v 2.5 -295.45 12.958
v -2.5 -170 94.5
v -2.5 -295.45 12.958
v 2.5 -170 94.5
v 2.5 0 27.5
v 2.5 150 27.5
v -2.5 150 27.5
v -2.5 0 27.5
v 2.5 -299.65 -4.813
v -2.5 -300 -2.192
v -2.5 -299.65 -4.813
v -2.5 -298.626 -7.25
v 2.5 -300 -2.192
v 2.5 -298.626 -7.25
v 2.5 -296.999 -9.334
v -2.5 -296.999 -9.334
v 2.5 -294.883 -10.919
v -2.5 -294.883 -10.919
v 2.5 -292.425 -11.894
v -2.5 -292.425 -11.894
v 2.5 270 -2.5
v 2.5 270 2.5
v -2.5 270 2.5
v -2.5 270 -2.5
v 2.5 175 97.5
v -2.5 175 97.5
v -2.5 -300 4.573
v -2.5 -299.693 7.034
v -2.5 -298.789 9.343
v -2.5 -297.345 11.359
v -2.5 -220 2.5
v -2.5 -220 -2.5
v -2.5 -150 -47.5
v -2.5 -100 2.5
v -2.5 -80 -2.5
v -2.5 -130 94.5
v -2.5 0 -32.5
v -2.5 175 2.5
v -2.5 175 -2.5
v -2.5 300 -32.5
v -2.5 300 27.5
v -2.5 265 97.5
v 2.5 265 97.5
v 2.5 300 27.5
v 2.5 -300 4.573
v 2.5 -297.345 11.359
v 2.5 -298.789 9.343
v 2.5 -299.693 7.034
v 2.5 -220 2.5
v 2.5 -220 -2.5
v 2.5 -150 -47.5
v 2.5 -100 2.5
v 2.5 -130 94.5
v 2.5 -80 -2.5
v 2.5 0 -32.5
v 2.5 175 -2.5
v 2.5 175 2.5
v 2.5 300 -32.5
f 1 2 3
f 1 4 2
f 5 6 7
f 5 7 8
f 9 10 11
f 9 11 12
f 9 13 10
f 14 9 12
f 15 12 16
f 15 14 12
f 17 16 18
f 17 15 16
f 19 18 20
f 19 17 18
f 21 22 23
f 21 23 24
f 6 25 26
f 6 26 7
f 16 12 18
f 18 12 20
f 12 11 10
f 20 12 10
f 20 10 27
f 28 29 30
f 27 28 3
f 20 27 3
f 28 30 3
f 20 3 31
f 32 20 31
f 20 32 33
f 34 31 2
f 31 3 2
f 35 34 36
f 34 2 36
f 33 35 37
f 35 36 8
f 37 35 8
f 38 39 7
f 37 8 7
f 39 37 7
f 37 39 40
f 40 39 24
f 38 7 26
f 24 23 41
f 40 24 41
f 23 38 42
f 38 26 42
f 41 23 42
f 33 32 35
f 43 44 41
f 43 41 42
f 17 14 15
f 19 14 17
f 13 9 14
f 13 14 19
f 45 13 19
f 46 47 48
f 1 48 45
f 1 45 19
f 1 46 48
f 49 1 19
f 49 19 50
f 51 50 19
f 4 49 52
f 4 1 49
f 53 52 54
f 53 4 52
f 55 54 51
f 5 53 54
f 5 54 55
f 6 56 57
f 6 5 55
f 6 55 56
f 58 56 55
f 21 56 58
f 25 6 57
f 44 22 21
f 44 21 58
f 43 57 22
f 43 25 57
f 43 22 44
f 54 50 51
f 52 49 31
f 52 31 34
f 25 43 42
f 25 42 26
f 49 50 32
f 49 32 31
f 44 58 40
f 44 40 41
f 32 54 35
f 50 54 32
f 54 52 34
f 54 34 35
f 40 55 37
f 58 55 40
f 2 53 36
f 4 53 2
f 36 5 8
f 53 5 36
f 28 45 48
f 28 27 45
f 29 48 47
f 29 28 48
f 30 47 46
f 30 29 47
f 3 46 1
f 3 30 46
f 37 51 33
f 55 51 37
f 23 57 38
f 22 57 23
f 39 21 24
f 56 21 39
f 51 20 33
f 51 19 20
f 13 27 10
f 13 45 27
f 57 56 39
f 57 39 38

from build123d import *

# Parameters (mm, degrees)
F1_DEPTH = 2.5
F2_R     = 10
F3_R     = 10


with BuildPart() as f1:
    # F0 (on Right) → F1 (new body, symmetric)
    with BuildSketch(Plane.YZ):
        Polygon((-300, 10), (-300, 0), (-300, -10), (-150, -47.5), (0, -32.5), (300, -32.5), (300, 27.5), (265, 97.5), (175, 97.5), (150, 27.5), (0, 27.5), (-130, 94.5), (-150, 94.5), (-170, 94.5), align=None)
        Polygon((-220, -2.5), (-220, 0), (-220, 2.5), (-100, 2.5), (-80, 2.5), (-80, -2.5), align=None, mode=Mode.SUBTRACT)
        Polygon((270, 2.5), (270, 0), (270, -2.5), (175, -2.5), (175, 2.5), align=None, mode=Mode.SUBTRACT)
        Polygon((-80, 2.5), (-100, 2.5), (-80, -2.5), align=None)
    extrude(amount=F1_DEPTH, both=True)

    # F2
    f2_edges = [f1.edges().sort_by_distance(p)[0] for p in [
        (0, -300, 10),
    ]]
    fillet(f2_edges, radius=F2_R)

    # F3
    f3_edges = [f1.edges().sort_by_distance(p)[0] for p in [
        (0, -300, -10),
    ]]
    fillet(f3_edges, radius=F3_R)


solid = f1.part
